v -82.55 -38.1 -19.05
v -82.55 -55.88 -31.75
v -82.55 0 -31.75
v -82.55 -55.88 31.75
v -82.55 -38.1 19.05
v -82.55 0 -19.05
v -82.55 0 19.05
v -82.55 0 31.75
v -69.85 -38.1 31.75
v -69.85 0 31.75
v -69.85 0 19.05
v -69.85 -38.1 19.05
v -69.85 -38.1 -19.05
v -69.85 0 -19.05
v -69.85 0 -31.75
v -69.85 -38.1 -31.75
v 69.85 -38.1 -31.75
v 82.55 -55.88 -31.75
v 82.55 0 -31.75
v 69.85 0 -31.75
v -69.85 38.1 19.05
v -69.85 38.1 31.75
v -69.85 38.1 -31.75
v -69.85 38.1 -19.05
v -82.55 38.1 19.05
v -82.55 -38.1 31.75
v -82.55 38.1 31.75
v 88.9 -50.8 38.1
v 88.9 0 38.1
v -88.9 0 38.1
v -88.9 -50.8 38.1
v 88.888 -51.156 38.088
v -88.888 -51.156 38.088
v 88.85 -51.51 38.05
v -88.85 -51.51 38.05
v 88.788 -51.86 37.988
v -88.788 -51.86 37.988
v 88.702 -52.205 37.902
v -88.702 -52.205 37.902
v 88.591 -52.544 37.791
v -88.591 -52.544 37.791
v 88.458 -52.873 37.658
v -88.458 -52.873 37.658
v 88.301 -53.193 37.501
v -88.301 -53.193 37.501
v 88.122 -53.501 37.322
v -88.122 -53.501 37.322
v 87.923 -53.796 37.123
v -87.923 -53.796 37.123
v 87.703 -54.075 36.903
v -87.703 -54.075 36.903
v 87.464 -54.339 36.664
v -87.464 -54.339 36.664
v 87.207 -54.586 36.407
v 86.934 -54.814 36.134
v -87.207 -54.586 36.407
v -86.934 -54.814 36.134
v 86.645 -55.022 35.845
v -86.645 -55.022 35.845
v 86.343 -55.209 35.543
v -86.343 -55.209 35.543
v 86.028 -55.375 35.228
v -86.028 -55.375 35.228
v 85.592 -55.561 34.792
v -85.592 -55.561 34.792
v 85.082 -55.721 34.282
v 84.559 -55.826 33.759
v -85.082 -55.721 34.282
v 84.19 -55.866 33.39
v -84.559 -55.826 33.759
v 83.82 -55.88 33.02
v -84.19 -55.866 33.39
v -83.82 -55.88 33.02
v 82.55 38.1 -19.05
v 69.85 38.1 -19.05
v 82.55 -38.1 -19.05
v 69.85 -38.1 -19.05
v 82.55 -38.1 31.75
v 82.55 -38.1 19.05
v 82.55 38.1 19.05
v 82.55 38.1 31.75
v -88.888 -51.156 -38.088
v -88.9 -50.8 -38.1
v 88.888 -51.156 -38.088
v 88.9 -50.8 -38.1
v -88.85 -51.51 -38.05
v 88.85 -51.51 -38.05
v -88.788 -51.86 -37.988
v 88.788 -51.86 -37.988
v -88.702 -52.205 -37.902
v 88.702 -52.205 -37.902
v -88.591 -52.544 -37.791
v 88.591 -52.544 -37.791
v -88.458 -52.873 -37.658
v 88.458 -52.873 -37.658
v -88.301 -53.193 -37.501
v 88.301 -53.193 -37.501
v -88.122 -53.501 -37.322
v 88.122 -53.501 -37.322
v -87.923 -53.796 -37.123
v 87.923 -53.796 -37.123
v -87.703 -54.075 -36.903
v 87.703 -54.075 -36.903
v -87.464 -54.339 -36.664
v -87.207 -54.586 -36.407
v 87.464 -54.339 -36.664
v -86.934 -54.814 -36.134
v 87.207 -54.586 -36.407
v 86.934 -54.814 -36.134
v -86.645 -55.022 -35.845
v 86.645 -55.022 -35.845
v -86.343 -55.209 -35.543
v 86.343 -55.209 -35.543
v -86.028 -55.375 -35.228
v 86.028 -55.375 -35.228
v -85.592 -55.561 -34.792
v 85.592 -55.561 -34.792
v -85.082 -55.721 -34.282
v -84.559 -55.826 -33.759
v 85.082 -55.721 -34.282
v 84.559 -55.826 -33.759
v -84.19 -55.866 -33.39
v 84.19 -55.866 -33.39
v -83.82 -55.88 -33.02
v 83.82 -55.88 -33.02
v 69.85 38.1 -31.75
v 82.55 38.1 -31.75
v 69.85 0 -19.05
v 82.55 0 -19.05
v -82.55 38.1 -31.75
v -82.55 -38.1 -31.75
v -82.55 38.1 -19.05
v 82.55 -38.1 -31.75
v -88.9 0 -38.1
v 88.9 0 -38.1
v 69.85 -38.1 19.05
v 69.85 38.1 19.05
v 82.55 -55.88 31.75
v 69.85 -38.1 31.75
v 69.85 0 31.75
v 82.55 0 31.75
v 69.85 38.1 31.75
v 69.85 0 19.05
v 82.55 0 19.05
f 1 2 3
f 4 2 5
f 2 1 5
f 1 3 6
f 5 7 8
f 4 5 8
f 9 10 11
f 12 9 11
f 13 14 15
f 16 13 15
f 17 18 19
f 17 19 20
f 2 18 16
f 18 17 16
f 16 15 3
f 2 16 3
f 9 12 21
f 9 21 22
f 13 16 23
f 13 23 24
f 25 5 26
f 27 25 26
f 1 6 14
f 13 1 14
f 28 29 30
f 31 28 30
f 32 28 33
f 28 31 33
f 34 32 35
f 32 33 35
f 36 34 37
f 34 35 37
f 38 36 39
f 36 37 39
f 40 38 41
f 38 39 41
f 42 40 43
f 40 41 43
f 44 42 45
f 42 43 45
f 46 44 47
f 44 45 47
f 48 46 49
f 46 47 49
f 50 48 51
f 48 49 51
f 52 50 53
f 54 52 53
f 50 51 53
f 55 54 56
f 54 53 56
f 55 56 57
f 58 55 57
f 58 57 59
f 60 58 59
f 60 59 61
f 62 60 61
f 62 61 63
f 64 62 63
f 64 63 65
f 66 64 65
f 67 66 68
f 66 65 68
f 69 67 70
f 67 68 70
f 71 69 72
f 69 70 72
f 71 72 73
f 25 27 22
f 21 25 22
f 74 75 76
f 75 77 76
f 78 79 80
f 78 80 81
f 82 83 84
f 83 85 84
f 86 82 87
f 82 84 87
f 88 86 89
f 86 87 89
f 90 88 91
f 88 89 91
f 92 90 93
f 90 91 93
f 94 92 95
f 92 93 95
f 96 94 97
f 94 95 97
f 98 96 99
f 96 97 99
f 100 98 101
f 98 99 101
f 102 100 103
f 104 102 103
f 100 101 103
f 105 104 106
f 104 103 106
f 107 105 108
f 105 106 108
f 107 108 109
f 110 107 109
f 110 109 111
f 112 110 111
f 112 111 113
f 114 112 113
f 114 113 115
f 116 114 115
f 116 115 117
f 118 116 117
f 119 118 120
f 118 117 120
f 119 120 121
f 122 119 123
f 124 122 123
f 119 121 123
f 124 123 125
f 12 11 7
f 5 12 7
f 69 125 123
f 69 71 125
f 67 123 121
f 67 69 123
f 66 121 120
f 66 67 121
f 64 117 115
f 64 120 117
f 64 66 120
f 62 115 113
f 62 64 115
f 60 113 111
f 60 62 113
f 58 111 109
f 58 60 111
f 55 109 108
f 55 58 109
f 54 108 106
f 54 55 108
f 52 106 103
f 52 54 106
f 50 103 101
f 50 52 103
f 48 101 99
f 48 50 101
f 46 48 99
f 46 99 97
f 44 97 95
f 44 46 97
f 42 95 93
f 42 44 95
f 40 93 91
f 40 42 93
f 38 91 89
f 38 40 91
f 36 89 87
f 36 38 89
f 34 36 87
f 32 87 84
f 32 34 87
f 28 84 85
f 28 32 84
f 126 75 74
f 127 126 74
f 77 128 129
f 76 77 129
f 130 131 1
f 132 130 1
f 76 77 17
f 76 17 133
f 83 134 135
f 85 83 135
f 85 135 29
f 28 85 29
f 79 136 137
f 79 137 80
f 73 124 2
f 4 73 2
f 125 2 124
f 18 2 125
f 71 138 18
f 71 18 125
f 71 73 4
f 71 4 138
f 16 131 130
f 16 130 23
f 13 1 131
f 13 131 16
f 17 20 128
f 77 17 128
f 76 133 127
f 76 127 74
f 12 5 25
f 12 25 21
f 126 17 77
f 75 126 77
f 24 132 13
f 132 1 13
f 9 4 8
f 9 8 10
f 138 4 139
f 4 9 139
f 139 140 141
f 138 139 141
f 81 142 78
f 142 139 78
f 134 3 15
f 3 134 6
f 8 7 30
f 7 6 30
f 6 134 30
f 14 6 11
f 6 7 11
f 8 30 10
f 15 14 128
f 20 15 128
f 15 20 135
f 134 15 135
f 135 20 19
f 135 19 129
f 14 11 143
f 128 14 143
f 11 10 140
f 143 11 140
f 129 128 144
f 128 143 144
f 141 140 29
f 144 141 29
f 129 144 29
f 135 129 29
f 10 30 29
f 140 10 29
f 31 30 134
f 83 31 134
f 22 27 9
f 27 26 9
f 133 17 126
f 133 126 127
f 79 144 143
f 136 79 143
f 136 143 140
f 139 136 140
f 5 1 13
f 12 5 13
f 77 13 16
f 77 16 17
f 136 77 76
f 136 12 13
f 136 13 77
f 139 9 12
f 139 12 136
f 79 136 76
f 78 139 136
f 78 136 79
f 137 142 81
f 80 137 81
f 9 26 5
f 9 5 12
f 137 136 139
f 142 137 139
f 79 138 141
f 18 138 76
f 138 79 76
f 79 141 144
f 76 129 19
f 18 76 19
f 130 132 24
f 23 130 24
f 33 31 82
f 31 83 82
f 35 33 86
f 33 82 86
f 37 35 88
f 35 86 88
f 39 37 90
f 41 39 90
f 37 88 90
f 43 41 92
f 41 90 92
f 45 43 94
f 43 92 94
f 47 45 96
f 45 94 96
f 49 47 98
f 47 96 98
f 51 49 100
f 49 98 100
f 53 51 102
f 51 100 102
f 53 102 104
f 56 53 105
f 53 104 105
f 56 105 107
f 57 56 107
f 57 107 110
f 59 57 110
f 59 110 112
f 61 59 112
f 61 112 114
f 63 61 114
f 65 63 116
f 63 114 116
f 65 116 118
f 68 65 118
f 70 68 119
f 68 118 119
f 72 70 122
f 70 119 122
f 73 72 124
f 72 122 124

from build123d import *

# Parameters (mm, degrees)
F0_W     = 139.7
F0_H     = 6.35
F0_W_2   = 6.35
F0_H_2   = 38.1
F1_DEPTH = 55.88
F2_DEPTH = 38.1
F0_W_3   = 12.7
F0_H_3   = 12.7
F3_DEPTH = 38.1
F4_R     = 5.08


with BuildPart() as f1:
    # F0 (on Front) → F1 (new body)
    with BuildSketch(Plane.XZ):
        Polygon((-69.85, 31.75), (-69.85, 38.1), (-88.9, 38.1), (-88.9, 19.05), (-82.55, 19.05), (-82.55, 31.75), align=None)
        with Locations((0, 34.925)):
            Rectangle(F0_W, F0_H)
        Polygon((88.9, 19.05), (88.9, 38.1), (69.85, 38.1), (69.85, 31.75), (82.55, 31.75), (82.55, 19.05), align=None)
        with Locations((85.725, 0)):
            Rectangle(F0_W_2, F0_H_2)
        Polygon((88.9, -38.1), (88.9, -19.05), (82.55, -19.05), (82.55, -31.75), (69.85, -31.75), (69.85, -38.1), align=None)
        with Locations((0, -34.925)):
            Rectangle(F0_W, F0_H)
        Polygon((-82.55, -19.05), (-88.9, -19.05), (-88.9, -38.1), (-69.85, -38.1), (-69.85, -31.75), (-82.55, -31.75), align=None)
        with Locations((-85.725, 0)):
            Rectangle(F0_W_2, F0_H_2)
    extrude(amount=F1_DEPTH)

    # F0 (on Front) → F2 (join)
    with BuildSketch(Plane.XZ):
        Polygon((69.85, 19.05), (69.85, 31.75), (-69.85, 31.75), (-69.85, 19.05), (-82.55, 19.05), (-82.55, -19.05), (-69.85, -19.05), (-69.85, -31.75), (69.85, -31.75), (69.85, -19.05), (82.55, -19.05), (82.55, 19.05), align=None)
    extrude(amount=F2_DEPTH)

    # F4
    f4_edges = [f1.edges().sort_by_distance(p)[0] for p in [
        (-88.9, -55.88, 0),
        (0, -55.88, 38.1),
        (0, -55.88, -38.1),
        (88.9, -55.88, 0),
    ]]
    fillet(f4_edges, radius=F4_R)


with BuildPart() as f3:
    # F0 (on Front) → F3 (new body, symmetric)
    with BuildSketch(Plane.XZ):
        with Locations((-76.2, 25.4)):
            Rectangle(F0_W_3, F0_H_3)
    extrude(amount=F3_DEPTH, both=True)


with BuildPart() as f3b:
    # F0 (on Front) → F3, piece 2 (new body, symmetric)
    with BuildSketch(Plane.XZ):
        with Locations((-76.2, -25.4)):
            Rectangle(F0_W_3, F0_H_3)
    extrude(amount=F3_DEPTH, both=True)


with BuildPart() as f3c:
    # F0 (on Front) → F3, piece 3 (new body, symmetric)
    with BuildSketch(Plane.XZ):
        with Locations((76.2, -25.4)):
            Rectangle(F0_W_3, F0_H_3)
    extrude(amount=F3_DEPTH, both=True)


with BuildPart() as f3d:
    # F0 (on Front) → F3, piece 4 (new body, symmetric)
    with BuildSketch(Plane.XZ):
        with Locations((76.2, 25.4)):
            Rectangle(F0_W_3, F0_H_3)
    extrude(amount=F3_DEPTH, both=True)


solid = Compound([f1.part, f3.part, f3b.part, f3c.part, f3d.part])
